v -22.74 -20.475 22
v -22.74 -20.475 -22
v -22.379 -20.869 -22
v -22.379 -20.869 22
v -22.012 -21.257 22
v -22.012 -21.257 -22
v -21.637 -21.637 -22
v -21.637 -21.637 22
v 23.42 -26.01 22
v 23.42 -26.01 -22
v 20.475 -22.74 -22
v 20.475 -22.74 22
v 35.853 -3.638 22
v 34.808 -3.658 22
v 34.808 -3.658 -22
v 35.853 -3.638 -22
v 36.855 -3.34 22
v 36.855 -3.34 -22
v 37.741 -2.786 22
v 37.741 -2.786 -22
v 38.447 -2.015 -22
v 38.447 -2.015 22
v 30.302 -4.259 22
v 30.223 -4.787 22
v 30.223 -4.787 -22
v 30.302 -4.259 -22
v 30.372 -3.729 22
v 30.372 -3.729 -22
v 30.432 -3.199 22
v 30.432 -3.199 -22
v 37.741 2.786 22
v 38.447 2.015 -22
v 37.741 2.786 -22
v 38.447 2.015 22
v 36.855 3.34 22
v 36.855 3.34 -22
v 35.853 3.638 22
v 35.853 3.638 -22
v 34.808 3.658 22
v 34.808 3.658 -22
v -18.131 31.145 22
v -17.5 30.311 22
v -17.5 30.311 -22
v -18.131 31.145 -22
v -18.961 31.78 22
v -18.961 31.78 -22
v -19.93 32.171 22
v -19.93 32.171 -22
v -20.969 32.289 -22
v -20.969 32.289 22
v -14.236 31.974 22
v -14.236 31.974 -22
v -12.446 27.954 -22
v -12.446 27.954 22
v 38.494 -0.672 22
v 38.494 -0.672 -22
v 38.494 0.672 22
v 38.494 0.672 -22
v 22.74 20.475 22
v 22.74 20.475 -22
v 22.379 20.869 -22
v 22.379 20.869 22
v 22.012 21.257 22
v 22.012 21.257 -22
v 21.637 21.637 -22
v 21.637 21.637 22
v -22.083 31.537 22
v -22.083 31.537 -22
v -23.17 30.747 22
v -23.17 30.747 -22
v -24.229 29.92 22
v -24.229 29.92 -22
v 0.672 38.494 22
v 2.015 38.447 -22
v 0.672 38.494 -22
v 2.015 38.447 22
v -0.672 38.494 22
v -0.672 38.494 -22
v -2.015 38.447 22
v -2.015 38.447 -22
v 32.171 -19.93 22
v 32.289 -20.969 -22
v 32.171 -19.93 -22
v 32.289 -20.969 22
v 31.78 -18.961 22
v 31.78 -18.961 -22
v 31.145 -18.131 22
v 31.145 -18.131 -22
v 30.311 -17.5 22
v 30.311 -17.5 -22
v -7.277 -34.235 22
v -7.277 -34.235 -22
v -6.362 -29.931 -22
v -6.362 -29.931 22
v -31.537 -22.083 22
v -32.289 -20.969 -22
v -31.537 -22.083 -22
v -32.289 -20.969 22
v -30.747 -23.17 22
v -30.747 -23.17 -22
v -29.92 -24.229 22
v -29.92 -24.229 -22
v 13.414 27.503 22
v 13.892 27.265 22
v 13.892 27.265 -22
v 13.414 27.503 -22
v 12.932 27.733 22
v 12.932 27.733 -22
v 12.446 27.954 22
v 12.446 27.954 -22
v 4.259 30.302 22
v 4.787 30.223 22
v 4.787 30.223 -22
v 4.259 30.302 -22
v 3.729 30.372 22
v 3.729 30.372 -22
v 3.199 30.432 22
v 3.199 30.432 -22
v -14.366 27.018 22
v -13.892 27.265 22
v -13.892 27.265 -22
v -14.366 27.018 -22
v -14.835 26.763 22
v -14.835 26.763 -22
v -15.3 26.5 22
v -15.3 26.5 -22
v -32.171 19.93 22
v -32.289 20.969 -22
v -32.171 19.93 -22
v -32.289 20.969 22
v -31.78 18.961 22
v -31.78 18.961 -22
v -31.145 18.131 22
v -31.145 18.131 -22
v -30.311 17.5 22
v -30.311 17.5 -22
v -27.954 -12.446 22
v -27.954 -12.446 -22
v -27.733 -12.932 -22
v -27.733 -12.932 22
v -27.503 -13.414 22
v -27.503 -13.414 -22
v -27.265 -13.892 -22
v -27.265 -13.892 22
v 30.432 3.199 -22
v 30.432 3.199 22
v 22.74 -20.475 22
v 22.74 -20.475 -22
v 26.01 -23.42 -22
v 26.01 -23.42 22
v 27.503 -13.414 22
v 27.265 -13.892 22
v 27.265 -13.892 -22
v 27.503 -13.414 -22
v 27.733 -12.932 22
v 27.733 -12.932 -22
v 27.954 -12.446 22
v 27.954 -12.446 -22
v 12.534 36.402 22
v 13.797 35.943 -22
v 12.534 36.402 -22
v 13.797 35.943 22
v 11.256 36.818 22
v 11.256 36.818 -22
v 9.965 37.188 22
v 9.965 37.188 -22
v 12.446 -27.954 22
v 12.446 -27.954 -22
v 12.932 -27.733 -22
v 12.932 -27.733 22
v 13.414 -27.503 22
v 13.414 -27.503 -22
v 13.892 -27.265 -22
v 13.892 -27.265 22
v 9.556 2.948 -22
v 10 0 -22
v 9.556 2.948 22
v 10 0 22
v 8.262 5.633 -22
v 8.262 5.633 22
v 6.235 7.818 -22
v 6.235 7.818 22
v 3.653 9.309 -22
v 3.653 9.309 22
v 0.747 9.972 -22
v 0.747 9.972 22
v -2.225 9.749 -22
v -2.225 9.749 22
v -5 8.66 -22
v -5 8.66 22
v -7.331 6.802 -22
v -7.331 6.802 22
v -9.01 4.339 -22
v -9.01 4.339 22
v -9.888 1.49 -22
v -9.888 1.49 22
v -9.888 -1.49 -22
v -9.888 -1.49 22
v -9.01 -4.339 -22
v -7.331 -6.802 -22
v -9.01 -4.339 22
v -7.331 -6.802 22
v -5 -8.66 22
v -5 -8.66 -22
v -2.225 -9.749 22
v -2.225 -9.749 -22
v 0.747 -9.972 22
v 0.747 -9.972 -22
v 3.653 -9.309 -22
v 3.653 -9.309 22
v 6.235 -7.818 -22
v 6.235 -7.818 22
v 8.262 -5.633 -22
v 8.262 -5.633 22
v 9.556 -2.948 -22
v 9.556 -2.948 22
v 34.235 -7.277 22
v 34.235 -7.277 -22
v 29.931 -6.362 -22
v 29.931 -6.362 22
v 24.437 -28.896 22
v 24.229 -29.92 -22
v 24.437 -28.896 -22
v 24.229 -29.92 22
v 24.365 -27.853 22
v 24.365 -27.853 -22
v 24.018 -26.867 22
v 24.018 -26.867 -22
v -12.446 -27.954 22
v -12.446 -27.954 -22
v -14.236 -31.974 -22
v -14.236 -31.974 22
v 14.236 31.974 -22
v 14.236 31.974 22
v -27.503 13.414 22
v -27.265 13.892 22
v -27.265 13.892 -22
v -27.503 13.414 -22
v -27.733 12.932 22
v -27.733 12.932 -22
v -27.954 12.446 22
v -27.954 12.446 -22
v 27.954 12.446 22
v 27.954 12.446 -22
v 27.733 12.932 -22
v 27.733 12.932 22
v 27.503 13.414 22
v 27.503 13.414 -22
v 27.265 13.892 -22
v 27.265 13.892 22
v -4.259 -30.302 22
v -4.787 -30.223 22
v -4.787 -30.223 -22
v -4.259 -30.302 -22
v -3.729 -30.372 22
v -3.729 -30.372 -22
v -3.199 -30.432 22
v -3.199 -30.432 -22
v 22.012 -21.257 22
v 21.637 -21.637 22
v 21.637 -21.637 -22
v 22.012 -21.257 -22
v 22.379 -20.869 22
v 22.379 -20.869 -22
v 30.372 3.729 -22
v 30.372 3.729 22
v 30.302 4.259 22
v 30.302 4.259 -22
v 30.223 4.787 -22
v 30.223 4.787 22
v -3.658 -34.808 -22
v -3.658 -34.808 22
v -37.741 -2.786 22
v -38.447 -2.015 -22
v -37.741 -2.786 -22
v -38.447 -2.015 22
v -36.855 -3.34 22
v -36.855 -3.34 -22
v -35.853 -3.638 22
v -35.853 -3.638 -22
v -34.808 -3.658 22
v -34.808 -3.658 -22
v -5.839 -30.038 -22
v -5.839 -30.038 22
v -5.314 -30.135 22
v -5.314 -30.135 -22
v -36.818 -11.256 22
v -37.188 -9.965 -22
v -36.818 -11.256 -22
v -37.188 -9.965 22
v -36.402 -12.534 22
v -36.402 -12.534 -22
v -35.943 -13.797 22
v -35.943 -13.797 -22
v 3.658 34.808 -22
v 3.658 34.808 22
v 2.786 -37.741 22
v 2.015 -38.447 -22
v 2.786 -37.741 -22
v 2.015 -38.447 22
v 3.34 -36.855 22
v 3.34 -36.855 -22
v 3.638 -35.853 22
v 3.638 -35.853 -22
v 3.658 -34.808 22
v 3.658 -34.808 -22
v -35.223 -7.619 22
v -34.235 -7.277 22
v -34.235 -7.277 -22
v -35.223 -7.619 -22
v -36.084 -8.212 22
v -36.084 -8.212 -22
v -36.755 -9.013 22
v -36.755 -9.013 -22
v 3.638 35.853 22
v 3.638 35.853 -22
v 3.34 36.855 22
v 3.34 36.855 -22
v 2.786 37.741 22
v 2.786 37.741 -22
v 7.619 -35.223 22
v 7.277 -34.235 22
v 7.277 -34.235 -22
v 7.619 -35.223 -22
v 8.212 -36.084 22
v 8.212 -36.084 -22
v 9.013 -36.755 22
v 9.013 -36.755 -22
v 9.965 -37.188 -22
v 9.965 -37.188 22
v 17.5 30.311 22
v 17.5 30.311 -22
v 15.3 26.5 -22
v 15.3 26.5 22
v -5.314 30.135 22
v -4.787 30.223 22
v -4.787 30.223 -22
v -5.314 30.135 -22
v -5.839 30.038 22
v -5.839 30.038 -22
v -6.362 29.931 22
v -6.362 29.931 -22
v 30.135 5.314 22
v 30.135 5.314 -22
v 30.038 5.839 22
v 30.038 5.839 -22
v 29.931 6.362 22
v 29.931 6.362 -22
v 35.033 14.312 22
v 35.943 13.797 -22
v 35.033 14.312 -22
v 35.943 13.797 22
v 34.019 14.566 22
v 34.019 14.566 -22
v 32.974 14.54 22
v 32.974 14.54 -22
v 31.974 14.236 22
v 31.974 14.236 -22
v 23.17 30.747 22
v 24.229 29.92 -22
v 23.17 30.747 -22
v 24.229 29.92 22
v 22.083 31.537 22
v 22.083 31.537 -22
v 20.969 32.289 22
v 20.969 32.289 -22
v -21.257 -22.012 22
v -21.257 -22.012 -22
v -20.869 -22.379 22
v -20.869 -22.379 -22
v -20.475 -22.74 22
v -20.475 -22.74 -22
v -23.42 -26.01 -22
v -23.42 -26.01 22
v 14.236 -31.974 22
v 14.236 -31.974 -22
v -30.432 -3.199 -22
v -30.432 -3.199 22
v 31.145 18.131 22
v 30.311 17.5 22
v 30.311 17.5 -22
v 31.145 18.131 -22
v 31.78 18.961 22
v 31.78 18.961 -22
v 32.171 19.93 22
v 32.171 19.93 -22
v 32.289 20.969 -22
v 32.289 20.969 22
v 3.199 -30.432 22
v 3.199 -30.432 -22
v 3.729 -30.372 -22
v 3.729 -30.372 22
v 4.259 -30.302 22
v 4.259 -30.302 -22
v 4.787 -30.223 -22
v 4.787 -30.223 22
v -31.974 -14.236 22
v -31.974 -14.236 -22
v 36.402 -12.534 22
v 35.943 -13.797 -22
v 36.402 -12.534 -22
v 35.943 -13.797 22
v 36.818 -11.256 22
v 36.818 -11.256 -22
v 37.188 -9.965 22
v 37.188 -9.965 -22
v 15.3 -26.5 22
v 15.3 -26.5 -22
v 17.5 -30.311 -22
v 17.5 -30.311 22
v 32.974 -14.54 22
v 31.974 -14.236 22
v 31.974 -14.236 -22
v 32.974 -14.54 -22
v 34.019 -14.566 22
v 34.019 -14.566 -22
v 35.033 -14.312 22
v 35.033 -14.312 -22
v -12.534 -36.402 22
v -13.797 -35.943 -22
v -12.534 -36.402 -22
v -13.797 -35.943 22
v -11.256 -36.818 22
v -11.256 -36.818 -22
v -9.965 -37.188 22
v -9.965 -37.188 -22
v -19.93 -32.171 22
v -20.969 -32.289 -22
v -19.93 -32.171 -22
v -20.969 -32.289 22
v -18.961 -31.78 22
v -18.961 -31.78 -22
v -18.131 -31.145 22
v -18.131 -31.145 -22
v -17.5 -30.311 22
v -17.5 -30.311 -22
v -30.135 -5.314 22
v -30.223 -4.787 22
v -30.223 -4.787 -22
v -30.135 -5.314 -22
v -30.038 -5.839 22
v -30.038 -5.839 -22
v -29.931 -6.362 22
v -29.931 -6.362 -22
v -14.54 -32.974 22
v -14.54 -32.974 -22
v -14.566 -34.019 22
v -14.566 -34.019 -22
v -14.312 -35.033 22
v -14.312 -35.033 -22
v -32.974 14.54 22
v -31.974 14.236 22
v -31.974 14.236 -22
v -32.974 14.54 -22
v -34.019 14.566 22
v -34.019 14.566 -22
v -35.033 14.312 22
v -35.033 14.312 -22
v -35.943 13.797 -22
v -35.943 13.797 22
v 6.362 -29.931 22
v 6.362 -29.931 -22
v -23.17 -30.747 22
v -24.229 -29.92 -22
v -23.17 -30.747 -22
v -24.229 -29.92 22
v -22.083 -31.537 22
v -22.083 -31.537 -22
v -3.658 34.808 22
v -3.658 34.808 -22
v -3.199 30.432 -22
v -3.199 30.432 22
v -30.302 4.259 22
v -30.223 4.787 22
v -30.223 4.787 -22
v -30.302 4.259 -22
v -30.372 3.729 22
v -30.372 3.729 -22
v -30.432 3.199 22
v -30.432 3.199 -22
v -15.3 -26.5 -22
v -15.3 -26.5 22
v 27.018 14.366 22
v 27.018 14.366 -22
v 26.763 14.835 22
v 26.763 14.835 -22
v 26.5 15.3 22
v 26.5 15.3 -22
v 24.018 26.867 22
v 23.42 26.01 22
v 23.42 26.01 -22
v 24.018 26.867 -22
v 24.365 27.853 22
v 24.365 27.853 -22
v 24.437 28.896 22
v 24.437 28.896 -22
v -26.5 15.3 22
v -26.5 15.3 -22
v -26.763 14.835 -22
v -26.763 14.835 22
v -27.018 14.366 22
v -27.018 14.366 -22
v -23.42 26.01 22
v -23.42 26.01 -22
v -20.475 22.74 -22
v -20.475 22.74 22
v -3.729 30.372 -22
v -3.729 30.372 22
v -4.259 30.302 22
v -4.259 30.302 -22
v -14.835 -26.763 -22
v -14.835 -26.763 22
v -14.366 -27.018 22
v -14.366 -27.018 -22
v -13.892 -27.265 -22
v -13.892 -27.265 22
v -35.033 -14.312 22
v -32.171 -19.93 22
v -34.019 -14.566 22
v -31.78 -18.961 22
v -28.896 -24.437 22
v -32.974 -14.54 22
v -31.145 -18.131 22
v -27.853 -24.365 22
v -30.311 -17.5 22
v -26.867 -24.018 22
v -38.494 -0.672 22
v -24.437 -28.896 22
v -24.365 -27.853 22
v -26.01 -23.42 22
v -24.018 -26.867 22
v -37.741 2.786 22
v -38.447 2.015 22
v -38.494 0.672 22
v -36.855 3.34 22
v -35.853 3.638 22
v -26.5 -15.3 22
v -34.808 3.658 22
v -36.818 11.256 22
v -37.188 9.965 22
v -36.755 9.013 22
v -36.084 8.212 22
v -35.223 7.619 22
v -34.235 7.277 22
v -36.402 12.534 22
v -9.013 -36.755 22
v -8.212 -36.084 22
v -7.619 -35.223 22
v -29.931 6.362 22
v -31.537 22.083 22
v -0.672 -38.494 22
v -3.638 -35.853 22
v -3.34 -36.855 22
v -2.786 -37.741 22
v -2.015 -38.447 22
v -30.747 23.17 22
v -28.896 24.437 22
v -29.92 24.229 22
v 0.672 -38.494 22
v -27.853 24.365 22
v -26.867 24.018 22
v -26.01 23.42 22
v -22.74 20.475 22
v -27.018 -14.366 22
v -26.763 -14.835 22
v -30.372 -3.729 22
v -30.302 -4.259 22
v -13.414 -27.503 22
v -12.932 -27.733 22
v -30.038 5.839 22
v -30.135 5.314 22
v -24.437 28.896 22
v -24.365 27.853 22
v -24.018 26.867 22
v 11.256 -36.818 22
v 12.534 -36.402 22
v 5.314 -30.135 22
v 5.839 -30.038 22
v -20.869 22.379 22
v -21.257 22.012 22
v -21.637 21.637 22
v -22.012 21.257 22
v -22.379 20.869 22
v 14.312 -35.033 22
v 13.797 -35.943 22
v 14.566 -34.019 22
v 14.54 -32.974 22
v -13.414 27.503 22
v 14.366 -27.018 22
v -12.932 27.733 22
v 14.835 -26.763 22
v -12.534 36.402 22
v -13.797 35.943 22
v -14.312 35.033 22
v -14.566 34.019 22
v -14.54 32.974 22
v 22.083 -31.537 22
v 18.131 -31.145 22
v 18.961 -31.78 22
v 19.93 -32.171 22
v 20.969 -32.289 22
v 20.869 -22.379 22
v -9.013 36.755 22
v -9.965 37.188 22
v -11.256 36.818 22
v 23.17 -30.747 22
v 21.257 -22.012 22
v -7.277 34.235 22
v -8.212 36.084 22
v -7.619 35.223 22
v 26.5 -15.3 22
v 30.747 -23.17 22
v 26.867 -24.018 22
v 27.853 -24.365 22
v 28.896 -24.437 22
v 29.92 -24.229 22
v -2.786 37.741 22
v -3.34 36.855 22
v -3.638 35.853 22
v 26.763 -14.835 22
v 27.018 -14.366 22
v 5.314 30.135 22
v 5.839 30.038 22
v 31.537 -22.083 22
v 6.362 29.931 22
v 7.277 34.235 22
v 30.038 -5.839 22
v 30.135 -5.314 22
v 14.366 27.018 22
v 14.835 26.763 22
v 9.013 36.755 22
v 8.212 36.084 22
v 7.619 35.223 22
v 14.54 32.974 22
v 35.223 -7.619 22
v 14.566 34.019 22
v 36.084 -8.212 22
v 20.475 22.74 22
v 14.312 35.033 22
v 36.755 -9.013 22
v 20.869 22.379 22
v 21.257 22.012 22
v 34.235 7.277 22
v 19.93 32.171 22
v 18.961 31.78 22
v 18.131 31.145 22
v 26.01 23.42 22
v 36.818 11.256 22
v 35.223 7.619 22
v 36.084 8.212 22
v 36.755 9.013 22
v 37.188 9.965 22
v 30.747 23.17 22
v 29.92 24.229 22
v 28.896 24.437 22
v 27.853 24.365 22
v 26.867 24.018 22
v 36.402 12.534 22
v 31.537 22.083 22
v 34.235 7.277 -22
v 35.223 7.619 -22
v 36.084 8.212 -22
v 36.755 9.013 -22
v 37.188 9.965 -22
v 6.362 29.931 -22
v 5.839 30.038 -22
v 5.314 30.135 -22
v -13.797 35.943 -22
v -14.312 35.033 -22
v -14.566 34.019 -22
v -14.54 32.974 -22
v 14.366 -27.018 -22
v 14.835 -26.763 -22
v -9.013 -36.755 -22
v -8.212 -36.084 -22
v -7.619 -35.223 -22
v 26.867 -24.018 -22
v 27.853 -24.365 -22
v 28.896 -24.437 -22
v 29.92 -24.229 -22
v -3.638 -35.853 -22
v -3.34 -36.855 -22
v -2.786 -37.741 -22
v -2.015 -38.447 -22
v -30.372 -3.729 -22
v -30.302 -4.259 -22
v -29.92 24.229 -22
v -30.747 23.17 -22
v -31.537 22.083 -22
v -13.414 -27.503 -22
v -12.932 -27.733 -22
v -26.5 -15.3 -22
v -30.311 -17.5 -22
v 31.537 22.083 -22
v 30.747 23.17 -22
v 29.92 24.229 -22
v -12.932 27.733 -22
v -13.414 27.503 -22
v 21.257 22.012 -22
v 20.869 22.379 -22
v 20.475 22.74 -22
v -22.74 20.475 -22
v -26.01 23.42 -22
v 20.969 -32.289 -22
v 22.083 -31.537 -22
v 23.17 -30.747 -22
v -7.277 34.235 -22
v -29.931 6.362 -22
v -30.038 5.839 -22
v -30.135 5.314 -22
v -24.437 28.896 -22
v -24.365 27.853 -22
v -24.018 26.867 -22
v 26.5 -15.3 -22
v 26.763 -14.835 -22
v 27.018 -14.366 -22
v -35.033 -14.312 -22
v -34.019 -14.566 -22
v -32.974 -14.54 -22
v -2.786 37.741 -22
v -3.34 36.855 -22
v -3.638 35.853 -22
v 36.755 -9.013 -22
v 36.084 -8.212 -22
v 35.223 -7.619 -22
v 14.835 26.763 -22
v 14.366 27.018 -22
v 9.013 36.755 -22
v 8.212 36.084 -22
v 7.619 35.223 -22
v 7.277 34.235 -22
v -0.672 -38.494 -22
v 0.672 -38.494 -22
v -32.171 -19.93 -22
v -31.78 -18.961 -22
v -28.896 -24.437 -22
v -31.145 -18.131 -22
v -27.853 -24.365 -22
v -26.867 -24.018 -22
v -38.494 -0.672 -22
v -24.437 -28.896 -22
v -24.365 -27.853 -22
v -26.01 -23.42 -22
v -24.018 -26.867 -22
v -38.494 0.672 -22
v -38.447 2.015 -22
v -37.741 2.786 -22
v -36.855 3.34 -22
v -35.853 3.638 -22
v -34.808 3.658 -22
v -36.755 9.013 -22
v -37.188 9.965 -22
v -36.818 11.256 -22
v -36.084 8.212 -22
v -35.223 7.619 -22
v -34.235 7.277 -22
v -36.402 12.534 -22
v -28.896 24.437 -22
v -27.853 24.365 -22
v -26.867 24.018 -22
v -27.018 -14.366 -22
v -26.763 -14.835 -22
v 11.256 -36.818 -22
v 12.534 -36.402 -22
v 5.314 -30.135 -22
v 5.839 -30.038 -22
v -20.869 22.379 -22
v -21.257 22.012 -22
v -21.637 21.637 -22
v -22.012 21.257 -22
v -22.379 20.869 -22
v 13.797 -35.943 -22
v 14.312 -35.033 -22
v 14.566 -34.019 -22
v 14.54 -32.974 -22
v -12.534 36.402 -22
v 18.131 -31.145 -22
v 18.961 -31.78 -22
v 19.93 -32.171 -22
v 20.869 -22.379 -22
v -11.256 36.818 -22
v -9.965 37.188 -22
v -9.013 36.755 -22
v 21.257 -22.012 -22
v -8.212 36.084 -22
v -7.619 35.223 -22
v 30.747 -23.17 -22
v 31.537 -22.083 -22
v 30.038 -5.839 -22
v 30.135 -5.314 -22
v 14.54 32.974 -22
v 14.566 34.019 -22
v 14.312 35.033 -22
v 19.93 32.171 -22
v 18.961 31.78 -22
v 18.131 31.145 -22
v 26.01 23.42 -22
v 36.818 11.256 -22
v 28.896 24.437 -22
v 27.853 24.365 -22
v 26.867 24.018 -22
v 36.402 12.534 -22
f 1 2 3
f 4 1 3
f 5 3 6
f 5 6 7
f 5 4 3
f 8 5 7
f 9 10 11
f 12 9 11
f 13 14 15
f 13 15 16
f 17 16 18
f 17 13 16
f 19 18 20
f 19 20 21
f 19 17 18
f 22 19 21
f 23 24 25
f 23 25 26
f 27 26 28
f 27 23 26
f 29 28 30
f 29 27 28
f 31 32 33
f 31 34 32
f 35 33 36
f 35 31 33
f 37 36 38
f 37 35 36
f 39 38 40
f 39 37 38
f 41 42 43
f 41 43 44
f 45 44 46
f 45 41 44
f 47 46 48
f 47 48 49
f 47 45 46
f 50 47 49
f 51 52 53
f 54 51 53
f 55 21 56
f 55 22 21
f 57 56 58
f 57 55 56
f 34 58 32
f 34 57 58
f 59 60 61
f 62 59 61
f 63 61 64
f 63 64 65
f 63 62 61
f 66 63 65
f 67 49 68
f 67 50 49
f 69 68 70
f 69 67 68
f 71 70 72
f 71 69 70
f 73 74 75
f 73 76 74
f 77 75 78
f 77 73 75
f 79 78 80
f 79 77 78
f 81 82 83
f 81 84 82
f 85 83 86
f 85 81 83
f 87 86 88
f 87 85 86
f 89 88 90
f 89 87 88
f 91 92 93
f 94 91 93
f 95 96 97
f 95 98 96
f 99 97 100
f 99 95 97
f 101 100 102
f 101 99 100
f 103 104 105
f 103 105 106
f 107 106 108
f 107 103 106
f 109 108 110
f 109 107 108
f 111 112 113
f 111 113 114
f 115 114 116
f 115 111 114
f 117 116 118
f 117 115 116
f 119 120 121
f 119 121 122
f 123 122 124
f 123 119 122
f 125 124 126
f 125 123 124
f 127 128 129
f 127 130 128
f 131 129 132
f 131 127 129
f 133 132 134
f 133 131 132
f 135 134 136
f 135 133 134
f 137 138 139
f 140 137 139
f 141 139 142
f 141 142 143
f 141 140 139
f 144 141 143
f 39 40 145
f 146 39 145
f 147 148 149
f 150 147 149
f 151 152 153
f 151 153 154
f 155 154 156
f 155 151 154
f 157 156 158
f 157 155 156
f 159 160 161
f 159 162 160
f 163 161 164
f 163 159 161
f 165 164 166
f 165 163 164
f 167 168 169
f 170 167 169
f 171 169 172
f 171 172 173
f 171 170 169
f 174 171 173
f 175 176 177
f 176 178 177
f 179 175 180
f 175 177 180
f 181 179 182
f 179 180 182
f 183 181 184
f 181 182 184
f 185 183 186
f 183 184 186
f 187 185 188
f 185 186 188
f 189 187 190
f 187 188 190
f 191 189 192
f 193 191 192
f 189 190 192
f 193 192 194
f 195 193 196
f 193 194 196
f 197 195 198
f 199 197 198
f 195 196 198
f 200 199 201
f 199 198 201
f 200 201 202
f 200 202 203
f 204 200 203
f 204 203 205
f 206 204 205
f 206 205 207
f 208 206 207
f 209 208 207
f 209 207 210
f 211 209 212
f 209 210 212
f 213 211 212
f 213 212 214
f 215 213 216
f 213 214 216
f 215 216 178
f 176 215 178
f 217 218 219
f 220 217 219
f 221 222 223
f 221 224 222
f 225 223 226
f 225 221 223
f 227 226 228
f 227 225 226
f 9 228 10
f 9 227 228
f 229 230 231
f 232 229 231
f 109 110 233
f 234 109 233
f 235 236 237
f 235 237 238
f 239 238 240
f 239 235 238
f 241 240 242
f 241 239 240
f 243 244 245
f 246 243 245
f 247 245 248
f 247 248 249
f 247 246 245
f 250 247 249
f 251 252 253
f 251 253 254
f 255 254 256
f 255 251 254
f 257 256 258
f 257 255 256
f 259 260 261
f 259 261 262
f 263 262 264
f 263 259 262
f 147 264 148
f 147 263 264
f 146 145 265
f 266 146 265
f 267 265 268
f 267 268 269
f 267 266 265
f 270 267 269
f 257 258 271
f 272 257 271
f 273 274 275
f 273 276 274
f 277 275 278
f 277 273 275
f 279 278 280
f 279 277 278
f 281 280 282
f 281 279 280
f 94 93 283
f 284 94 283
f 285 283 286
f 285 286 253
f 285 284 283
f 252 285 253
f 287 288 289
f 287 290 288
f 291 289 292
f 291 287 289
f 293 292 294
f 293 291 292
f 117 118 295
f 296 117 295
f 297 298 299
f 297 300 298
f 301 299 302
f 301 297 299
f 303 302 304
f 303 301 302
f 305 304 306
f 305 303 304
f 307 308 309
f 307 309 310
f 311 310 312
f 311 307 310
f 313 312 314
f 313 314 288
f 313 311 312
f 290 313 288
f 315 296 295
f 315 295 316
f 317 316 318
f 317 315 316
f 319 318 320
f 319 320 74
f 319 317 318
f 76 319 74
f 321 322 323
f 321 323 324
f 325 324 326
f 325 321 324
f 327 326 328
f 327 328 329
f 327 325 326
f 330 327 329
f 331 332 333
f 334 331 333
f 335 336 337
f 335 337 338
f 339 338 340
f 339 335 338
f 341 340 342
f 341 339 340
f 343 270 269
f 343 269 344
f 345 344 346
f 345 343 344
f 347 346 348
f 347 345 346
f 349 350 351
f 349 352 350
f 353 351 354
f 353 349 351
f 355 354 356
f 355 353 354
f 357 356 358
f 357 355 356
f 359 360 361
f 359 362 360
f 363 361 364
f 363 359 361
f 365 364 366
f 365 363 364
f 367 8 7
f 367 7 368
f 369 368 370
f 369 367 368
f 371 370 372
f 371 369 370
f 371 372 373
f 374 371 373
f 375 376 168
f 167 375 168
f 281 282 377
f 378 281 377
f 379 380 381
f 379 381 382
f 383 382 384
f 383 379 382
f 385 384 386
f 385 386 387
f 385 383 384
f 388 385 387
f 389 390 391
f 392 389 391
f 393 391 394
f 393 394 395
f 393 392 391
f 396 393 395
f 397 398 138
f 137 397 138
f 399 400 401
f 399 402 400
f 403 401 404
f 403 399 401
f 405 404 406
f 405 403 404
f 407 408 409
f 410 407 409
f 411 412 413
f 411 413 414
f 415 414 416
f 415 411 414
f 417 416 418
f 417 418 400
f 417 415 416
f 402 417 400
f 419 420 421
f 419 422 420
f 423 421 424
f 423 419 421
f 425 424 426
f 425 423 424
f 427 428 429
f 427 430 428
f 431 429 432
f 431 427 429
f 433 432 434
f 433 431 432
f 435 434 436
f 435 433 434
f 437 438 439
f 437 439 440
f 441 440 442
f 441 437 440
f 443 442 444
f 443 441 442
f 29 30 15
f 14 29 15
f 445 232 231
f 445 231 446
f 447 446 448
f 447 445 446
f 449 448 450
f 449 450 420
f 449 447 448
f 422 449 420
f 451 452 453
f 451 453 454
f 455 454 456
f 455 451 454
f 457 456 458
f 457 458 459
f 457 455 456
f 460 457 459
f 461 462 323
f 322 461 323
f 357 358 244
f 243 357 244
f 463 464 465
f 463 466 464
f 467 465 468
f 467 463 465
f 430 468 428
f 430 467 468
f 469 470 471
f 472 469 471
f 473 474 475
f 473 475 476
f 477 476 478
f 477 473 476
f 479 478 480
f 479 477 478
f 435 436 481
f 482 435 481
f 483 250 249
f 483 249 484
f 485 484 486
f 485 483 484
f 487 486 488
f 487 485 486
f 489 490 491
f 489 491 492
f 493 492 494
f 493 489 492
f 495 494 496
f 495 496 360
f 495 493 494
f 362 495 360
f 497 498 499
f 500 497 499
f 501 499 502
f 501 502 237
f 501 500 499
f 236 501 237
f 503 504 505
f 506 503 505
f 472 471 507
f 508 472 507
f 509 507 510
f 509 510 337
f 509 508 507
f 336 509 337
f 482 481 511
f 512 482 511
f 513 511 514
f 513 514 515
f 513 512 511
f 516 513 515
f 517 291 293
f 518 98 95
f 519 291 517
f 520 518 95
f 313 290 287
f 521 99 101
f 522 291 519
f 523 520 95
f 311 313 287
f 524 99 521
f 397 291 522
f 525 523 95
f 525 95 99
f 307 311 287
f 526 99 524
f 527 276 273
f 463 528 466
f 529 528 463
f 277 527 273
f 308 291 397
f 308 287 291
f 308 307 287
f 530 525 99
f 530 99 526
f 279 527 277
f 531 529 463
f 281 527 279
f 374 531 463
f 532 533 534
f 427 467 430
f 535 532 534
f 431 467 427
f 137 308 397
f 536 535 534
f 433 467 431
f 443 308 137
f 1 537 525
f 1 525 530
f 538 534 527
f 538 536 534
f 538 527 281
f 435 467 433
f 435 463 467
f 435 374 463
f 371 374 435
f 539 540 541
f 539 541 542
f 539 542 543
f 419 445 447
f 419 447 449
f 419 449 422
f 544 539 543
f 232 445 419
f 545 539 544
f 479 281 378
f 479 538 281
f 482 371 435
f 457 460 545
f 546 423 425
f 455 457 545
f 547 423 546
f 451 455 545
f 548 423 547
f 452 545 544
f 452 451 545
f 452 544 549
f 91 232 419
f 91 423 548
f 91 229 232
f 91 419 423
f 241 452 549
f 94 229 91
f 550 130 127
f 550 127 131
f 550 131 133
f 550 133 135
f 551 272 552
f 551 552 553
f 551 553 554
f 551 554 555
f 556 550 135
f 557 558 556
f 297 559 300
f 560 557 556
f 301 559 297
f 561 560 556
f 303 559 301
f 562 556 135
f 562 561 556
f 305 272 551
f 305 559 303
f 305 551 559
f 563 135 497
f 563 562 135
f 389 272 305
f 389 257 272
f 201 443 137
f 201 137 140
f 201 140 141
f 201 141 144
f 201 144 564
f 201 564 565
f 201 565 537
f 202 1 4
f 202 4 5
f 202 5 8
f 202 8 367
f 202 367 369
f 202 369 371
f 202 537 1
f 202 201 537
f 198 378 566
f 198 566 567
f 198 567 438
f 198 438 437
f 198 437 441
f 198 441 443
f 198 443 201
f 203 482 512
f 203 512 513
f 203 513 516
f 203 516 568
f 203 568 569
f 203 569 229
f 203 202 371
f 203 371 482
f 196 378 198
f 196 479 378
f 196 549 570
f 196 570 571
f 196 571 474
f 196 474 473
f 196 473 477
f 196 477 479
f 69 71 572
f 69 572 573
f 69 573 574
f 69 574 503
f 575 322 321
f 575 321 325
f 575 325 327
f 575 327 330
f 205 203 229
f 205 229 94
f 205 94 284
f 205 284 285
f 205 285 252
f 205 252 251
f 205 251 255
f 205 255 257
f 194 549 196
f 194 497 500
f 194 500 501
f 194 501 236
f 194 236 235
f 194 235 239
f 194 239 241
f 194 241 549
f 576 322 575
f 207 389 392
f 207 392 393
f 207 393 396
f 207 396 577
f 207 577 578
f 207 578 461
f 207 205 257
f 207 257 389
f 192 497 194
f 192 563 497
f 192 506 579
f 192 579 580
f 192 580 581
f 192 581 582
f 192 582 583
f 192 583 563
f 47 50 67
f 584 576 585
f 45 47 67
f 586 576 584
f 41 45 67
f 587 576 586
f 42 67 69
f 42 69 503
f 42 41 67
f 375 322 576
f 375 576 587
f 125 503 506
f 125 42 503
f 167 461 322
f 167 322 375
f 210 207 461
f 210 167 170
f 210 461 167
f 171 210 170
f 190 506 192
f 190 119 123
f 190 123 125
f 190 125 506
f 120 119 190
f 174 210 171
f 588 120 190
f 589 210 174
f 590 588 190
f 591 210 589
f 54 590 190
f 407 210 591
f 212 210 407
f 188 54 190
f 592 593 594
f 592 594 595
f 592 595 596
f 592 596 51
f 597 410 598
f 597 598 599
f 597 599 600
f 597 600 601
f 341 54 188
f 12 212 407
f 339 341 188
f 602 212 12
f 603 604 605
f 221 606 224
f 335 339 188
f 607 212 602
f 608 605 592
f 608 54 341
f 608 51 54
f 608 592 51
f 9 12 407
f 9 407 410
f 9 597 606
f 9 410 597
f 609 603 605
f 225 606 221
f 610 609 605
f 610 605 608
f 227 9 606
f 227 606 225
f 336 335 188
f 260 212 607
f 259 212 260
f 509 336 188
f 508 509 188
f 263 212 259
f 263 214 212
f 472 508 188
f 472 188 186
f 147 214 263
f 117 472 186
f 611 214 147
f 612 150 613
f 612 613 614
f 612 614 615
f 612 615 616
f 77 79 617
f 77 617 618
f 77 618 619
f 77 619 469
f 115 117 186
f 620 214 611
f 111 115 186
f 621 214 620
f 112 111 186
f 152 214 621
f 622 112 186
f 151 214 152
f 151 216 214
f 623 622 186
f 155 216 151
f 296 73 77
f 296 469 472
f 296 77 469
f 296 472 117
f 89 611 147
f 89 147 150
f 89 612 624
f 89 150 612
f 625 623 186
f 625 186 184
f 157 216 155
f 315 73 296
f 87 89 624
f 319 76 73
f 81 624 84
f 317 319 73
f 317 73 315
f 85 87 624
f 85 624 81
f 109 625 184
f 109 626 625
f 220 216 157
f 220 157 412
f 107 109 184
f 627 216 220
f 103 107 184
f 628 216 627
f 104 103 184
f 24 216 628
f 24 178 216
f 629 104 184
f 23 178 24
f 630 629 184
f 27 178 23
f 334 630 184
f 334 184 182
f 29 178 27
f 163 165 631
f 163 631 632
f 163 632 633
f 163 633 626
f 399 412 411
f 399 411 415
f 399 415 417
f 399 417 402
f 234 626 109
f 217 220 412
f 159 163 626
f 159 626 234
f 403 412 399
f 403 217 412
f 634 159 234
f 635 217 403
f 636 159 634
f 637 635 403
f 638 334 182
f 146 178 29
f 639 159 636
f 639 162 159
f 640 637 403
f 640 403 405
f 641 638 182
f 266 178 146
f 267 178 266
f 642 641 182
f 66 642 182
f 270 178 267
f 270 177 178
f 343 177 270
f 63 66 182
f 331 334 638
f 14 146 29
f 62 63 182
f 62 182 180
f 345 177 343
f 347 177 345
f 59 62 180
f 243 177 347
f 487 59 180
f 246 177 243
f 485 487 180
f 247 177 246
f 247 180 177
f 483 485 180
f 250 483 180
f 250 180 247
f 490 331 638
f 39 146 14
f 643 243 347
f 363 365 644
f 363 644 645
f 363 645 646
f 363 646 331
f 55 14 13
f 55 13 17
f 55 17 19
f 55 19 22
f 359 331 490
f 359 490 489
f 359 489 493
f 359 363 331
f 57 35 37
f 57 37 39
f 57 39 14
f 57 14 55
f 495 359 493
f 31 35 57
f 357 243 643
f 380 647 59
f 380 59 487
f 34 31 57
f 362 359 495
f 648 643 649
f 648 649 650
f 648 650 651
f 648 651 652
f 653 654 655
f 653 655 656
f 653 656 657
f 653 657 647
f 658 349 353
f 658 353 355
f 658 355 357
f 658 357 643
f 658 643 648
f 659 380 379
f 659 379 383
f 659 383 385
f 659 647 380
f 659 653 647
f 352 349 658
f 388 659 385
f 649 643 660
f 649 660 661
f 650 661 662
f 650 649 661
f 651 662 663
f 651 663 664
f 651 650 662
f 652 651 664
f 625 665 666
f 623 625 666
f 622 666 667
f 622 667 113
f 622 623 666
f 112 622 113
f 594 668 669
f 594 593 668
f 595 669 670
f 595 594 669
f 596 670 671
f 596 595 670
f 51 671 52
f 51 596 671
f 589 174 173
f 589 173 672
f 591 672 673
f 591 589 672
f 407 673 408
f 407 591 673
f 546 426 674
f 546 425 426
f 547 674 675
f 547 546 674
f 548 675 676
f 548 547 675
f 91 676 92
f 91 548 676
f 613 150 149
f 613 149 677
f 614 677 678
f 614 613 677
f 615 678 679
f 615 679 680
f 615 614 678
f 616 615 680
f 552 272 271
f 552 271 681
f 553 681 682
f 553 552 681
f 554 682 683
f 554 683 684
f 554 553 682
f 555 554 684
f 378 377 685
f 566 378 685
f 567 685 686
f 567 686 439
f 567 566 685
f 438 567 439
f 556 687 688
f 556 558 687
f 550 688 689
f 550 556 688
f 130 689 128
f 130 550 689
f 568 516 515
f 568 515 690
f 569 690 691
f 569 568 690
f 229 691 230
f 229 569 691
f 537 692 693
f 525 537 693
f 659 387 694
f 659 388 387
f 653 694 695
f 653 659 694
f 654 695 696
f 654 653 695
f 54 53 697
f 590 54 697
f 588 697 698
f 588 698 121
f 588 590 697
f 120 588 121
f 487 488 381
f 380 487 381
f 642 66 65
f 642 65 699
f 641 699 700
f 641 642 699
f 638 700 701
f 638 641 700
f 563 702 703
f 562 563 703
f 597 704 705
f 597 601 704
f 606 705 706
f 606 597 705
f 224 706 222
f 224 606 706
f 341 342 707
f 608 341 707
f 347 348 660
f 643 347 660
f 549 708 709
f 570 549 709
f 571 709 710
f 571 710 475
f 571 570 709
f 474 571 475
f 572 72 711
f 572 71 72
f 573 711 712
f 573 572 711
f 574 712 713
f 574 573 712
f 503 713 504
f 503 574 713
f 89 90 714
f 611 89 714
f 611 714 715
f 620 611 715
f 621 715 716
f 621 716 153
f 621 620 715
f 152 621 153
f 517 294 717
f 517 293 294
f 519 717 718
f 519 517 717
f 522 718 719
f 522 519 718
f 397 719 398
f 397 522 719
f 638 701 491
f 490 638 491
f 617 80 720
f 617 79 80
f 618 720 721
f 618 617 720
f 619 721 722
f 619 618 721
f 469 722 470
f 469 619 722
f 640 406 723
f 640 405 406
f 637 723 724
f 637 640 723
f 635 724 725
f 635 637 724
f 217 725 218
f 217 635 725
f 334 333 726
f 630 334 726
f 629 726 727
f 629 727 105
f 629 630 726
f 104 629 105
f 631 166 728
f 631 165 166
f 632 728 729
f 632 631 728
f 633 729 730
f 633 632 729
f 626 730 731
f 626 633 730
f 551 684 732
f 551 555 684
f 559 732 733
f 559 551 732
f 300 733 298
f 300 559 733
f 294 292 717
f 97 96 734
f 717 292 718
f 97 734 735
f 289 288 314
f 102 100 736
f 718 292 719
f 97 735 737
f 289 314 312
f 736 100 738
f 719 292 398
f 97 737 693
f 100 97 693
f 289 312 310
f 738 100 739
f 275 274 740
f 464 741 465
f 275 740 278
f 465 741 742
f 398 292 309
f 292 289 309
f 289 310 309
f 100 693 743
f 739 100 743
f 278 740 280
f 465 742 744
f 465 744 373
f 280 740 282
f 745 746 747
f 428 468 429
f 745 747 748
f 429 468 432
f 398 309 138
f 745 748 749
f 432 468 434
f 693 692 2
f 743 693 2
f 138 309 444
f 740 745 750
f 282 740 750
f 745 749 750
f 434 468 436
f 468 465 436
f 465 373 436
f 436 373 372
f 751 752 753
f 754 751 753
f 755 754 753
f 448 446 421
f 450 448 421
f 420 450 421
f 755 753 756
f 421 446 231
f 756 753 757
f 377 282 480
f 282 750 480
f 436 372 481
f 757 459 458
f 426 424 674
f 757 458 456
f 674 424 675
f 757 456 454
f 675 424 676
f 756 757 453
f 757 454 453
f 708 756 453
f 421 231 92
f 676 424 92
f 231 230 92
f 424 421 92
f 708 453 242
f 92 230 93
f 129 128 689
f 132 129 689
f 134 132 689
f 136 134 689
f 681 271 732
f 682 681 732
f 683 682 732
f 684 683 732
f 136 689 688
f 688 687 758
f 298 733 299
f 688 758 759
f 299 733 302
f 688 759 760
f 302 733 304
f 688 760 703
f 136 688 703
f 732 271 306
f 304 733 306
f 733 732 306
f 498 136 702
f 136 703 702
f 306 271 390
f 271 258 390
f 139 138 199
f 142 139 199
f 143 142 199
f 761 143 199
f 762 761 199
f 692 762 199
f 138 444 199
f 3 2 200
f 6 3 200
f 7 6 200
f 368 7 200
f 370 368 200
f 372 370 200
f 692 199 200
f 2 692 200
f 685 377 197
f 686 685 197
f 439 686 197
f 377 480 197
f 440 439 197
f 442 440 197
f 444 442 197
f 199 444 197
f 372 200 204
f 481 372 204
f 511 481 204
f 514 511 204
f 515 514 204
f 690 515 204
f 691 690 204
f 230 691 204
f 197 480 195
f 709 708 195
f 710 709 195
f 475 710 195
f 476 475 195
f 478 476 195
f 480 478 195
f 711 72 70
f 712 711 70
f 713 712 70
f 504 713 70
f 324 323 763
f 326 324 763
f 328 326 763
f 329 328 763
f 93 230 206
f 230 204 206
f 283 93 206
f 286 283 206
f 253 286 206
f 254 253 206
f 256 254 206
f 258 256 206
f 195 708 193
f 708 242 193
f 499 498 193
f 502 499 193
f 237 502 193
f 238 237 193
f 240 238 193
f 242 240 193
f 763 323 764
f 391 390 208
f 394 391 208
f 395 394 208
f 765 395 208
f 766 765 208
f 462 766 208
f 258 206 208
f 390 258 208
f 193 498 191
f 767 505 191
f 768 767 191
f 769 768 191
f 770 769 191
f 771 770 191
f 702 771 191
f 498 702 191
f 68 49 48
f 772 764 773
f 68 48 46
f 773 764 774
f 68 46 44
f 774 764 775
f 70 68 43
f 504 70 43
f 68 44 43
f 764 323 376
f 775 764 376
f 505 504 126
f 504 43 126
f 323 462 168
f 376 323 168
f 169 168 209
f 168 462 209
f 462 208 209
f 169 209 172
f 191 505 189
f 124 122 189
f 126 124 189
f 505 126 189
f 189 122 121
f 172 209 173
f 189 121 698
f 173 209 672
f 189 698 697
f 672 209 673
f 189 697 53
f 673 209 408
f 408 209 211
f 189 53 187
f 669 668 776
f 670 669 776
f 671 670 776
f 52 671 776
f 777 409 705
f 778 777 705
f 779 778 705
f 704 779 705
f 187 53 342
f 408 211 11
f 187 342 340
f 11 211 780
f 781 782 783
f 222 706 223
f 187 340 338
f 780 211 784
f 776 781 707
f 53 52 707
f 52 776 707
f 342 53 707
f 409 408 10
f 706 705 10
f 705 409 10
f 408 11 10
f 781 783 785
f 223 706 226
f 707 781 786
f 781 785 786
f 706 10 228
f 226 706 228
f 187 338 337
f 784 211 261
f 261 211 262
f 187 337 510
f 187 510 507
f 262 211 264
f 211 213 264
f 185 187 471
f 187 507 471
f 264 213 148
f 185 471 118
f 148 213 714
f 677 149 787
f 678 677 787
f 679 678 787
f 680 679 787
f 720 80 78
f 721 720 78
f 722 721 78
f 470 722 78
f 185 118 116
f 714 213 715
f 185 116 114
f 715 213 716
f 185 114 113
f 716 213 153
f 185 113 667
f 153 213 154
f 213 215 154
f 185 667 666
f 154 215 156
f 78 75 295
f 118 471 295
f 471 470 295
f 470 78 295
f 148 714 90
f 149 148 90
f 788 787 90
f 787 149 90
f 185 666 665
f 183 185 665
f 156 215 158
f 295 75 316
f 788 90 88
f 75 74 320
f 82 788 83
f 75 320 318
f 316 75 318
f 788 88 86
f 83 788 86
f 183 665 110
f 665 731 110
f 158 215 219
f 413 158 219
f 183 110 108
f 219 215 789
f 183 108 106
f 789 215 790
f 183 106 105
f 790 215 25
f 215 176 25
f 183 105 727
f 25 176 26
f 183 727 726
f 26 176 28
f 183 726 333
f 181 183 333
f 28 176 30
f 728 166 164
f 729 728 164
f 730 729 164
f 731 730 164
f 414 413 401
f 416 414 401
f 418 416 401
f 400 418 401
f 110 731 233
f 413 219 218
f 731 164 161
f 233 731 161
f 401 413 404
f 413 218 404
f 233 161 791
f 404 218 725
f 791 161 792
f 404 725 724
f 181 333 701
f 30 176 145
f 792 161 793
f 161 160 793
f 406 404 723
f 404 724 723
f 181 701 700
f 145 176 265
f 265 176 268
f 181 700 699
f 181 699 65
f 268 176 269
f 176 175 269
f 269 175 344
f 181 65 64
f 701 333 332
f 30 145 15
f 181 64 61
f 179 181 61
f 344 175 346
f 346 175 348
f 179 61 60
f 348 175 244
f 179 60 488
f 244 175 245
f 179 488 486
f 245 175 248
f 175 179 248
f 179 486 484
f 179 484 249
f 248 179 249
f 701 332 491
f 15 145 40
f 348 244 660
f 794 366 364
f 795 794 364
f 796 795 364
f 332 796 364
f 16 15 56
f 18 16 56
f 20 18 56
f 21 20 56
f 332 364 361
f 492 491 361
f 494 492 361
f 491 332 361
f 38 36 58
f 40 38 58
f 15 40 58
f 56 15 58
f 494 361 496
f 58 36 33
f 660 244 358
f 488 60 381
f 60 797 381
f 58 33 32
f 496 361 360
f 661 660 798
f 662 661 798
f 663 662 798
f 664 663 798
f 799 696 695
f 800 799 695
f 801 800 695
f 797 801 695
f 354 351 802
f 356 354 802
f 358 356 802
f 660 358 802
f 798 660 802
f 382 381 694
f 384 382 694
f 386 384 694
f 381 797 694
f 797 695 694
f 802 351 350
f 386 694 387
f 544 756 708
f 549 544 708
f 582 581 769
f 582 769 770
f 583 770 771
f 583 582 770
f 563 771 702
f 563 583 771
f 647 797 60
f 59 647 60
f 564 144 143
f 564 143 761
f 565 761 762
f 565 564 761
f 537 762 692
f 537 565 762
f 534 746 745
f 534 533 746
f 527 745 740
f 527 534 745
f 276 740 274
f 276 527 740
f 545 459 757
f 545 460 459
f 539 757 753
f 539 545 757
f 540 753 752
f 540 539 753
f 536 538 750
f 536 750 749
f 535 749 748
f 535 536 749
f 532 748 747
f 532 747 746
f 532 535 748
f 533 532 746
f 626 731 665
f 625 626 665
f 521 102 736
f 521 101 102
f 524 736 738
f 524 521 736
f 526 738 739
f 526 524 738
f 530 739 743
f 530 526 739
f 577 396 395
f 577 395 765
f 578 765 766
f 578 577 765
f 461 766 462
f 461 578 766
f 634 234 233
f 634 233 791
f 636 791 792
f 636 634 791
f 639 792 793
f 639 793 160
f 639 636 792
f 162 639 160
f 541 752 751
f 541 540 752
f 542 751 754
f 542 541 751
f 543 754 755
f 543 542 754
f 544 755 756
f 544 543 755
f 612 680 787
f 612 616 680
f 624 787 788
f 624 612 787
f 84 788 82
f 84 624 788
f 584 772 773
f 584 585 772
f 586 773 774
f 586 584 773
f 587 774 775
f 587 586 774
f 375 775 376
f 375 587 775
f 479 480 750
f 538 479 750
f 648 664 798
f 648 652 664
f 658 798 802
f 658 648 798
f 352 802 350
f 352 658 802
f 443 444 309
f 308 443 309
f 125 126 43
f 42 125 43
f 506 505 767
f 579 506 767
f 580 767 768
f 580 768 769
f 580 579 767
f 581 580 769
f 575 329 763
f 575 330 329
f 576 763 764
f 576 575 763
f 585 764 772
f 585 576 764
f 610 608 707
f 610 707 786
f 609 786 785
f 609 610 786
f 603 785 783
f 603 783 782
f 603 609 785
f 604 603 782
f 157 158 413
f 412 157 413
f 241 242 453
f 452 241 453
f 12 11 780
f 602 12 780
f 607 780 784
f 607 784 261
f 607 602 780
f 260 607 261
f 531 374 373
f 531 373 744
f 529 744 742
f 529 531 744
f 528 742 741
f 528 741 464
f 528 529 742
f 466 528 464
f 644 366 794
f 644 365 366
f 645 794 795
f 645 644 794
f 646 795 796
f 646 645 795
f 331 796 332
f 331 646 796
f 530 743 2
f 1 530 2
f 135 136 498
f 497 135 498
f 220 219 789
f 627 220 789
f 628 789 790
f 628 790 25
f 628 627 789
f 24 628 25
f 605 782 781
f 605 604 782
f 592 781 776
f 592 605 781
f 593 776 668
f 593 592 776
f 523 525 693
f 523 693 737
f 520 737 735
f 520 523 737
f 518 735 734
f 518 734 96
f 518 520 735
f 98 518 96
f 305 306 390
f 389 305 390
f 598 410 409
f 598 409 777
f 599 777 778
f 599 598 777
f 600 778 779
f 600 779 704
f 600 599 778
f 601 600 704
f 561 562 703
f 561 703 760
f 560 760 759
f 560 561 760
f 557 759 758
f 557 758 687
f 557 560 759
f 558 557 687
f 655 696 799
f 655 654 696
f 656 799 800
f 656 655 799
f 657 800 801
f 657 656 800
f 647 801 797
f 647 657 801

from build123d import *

# Parameters (mm, degrees)
BOSS_EXTRUDE3_DEPTH     = 22
CIRPATTERN3_COUNT       = 20
SKETCH2_R               = 10
CUT_EXTRUDE1_DEPTH      = 23
CUT_EXTRUDE1_DEPTH_BACK = 23


with BuildPart() as part:
    # Sketch1 → Boss-Extrude3 (new body, symmetric)
    with BuildSketch(Plane.XY):
        with BuildLine():
            Line((34.808266338, 3.658496214), (30.432369998, 3.198570976))
            ThreePointArc((30.432369998, 3.198570976), (30.338212758, 3.994101482), (30.223263222, 4.78689463))
            Line((30.223263222, 4.78689463), (0, 0))
            Line((0, 0), (30.223263222, -4.78689463))
            ThreePointArc((30.223263222, -4.78689463), (30.338212758, -3.994101482), (30.432369998, -3.198570976))
            Line((30.432369998, -3.198570976), (34.808266338, -3.658496214))
            ThreePointArc((34.808266338, -3.658496214), (36.855171385, -3.340239675), (38.447237088, -2.014934315))
            ThreePointArc((38.447237088, -2.014934315), (38.5, 0), (38.447237088, 2.014934315))
            ThreePointArc((38.447237088, 2.014934315), (36.855171385, 3.340239675), (34.808266338, 3.658496214))
        make_face()
    boss_extrude3 = extrude(amount=BOSS_EXTRUDE3_DEPTH, both=True)

    # CirPattern3: Boss-Extrude3 ×20 about axis
    cirpattern3_axis = Axis((0, 0, 0), (0, 0, 1))
    for i in range(1, CIRPATTERN3_COUNT):
        add(boss_extrude3.rotate(cirpattern3_axis, i * 360 / CIRPATTERN3_COUNT))

    # Sketch2 → Cut-Extrude1 (cut, two sides)
    with BuildSketch(Plane.XY) as cut_extrude1_sk:
        Circle(SKETCH2_R)
    extrude(amount=CUT_EXTRUDE1_DEPTH, mode=Mode.SUBTRACT)
    extrude(cut_extrude1_sk.sketch, amount=-CUT_EXTRUDE1_DEPTH_BACK, mode=Mode.SUBTRACT)


solid = part.part
